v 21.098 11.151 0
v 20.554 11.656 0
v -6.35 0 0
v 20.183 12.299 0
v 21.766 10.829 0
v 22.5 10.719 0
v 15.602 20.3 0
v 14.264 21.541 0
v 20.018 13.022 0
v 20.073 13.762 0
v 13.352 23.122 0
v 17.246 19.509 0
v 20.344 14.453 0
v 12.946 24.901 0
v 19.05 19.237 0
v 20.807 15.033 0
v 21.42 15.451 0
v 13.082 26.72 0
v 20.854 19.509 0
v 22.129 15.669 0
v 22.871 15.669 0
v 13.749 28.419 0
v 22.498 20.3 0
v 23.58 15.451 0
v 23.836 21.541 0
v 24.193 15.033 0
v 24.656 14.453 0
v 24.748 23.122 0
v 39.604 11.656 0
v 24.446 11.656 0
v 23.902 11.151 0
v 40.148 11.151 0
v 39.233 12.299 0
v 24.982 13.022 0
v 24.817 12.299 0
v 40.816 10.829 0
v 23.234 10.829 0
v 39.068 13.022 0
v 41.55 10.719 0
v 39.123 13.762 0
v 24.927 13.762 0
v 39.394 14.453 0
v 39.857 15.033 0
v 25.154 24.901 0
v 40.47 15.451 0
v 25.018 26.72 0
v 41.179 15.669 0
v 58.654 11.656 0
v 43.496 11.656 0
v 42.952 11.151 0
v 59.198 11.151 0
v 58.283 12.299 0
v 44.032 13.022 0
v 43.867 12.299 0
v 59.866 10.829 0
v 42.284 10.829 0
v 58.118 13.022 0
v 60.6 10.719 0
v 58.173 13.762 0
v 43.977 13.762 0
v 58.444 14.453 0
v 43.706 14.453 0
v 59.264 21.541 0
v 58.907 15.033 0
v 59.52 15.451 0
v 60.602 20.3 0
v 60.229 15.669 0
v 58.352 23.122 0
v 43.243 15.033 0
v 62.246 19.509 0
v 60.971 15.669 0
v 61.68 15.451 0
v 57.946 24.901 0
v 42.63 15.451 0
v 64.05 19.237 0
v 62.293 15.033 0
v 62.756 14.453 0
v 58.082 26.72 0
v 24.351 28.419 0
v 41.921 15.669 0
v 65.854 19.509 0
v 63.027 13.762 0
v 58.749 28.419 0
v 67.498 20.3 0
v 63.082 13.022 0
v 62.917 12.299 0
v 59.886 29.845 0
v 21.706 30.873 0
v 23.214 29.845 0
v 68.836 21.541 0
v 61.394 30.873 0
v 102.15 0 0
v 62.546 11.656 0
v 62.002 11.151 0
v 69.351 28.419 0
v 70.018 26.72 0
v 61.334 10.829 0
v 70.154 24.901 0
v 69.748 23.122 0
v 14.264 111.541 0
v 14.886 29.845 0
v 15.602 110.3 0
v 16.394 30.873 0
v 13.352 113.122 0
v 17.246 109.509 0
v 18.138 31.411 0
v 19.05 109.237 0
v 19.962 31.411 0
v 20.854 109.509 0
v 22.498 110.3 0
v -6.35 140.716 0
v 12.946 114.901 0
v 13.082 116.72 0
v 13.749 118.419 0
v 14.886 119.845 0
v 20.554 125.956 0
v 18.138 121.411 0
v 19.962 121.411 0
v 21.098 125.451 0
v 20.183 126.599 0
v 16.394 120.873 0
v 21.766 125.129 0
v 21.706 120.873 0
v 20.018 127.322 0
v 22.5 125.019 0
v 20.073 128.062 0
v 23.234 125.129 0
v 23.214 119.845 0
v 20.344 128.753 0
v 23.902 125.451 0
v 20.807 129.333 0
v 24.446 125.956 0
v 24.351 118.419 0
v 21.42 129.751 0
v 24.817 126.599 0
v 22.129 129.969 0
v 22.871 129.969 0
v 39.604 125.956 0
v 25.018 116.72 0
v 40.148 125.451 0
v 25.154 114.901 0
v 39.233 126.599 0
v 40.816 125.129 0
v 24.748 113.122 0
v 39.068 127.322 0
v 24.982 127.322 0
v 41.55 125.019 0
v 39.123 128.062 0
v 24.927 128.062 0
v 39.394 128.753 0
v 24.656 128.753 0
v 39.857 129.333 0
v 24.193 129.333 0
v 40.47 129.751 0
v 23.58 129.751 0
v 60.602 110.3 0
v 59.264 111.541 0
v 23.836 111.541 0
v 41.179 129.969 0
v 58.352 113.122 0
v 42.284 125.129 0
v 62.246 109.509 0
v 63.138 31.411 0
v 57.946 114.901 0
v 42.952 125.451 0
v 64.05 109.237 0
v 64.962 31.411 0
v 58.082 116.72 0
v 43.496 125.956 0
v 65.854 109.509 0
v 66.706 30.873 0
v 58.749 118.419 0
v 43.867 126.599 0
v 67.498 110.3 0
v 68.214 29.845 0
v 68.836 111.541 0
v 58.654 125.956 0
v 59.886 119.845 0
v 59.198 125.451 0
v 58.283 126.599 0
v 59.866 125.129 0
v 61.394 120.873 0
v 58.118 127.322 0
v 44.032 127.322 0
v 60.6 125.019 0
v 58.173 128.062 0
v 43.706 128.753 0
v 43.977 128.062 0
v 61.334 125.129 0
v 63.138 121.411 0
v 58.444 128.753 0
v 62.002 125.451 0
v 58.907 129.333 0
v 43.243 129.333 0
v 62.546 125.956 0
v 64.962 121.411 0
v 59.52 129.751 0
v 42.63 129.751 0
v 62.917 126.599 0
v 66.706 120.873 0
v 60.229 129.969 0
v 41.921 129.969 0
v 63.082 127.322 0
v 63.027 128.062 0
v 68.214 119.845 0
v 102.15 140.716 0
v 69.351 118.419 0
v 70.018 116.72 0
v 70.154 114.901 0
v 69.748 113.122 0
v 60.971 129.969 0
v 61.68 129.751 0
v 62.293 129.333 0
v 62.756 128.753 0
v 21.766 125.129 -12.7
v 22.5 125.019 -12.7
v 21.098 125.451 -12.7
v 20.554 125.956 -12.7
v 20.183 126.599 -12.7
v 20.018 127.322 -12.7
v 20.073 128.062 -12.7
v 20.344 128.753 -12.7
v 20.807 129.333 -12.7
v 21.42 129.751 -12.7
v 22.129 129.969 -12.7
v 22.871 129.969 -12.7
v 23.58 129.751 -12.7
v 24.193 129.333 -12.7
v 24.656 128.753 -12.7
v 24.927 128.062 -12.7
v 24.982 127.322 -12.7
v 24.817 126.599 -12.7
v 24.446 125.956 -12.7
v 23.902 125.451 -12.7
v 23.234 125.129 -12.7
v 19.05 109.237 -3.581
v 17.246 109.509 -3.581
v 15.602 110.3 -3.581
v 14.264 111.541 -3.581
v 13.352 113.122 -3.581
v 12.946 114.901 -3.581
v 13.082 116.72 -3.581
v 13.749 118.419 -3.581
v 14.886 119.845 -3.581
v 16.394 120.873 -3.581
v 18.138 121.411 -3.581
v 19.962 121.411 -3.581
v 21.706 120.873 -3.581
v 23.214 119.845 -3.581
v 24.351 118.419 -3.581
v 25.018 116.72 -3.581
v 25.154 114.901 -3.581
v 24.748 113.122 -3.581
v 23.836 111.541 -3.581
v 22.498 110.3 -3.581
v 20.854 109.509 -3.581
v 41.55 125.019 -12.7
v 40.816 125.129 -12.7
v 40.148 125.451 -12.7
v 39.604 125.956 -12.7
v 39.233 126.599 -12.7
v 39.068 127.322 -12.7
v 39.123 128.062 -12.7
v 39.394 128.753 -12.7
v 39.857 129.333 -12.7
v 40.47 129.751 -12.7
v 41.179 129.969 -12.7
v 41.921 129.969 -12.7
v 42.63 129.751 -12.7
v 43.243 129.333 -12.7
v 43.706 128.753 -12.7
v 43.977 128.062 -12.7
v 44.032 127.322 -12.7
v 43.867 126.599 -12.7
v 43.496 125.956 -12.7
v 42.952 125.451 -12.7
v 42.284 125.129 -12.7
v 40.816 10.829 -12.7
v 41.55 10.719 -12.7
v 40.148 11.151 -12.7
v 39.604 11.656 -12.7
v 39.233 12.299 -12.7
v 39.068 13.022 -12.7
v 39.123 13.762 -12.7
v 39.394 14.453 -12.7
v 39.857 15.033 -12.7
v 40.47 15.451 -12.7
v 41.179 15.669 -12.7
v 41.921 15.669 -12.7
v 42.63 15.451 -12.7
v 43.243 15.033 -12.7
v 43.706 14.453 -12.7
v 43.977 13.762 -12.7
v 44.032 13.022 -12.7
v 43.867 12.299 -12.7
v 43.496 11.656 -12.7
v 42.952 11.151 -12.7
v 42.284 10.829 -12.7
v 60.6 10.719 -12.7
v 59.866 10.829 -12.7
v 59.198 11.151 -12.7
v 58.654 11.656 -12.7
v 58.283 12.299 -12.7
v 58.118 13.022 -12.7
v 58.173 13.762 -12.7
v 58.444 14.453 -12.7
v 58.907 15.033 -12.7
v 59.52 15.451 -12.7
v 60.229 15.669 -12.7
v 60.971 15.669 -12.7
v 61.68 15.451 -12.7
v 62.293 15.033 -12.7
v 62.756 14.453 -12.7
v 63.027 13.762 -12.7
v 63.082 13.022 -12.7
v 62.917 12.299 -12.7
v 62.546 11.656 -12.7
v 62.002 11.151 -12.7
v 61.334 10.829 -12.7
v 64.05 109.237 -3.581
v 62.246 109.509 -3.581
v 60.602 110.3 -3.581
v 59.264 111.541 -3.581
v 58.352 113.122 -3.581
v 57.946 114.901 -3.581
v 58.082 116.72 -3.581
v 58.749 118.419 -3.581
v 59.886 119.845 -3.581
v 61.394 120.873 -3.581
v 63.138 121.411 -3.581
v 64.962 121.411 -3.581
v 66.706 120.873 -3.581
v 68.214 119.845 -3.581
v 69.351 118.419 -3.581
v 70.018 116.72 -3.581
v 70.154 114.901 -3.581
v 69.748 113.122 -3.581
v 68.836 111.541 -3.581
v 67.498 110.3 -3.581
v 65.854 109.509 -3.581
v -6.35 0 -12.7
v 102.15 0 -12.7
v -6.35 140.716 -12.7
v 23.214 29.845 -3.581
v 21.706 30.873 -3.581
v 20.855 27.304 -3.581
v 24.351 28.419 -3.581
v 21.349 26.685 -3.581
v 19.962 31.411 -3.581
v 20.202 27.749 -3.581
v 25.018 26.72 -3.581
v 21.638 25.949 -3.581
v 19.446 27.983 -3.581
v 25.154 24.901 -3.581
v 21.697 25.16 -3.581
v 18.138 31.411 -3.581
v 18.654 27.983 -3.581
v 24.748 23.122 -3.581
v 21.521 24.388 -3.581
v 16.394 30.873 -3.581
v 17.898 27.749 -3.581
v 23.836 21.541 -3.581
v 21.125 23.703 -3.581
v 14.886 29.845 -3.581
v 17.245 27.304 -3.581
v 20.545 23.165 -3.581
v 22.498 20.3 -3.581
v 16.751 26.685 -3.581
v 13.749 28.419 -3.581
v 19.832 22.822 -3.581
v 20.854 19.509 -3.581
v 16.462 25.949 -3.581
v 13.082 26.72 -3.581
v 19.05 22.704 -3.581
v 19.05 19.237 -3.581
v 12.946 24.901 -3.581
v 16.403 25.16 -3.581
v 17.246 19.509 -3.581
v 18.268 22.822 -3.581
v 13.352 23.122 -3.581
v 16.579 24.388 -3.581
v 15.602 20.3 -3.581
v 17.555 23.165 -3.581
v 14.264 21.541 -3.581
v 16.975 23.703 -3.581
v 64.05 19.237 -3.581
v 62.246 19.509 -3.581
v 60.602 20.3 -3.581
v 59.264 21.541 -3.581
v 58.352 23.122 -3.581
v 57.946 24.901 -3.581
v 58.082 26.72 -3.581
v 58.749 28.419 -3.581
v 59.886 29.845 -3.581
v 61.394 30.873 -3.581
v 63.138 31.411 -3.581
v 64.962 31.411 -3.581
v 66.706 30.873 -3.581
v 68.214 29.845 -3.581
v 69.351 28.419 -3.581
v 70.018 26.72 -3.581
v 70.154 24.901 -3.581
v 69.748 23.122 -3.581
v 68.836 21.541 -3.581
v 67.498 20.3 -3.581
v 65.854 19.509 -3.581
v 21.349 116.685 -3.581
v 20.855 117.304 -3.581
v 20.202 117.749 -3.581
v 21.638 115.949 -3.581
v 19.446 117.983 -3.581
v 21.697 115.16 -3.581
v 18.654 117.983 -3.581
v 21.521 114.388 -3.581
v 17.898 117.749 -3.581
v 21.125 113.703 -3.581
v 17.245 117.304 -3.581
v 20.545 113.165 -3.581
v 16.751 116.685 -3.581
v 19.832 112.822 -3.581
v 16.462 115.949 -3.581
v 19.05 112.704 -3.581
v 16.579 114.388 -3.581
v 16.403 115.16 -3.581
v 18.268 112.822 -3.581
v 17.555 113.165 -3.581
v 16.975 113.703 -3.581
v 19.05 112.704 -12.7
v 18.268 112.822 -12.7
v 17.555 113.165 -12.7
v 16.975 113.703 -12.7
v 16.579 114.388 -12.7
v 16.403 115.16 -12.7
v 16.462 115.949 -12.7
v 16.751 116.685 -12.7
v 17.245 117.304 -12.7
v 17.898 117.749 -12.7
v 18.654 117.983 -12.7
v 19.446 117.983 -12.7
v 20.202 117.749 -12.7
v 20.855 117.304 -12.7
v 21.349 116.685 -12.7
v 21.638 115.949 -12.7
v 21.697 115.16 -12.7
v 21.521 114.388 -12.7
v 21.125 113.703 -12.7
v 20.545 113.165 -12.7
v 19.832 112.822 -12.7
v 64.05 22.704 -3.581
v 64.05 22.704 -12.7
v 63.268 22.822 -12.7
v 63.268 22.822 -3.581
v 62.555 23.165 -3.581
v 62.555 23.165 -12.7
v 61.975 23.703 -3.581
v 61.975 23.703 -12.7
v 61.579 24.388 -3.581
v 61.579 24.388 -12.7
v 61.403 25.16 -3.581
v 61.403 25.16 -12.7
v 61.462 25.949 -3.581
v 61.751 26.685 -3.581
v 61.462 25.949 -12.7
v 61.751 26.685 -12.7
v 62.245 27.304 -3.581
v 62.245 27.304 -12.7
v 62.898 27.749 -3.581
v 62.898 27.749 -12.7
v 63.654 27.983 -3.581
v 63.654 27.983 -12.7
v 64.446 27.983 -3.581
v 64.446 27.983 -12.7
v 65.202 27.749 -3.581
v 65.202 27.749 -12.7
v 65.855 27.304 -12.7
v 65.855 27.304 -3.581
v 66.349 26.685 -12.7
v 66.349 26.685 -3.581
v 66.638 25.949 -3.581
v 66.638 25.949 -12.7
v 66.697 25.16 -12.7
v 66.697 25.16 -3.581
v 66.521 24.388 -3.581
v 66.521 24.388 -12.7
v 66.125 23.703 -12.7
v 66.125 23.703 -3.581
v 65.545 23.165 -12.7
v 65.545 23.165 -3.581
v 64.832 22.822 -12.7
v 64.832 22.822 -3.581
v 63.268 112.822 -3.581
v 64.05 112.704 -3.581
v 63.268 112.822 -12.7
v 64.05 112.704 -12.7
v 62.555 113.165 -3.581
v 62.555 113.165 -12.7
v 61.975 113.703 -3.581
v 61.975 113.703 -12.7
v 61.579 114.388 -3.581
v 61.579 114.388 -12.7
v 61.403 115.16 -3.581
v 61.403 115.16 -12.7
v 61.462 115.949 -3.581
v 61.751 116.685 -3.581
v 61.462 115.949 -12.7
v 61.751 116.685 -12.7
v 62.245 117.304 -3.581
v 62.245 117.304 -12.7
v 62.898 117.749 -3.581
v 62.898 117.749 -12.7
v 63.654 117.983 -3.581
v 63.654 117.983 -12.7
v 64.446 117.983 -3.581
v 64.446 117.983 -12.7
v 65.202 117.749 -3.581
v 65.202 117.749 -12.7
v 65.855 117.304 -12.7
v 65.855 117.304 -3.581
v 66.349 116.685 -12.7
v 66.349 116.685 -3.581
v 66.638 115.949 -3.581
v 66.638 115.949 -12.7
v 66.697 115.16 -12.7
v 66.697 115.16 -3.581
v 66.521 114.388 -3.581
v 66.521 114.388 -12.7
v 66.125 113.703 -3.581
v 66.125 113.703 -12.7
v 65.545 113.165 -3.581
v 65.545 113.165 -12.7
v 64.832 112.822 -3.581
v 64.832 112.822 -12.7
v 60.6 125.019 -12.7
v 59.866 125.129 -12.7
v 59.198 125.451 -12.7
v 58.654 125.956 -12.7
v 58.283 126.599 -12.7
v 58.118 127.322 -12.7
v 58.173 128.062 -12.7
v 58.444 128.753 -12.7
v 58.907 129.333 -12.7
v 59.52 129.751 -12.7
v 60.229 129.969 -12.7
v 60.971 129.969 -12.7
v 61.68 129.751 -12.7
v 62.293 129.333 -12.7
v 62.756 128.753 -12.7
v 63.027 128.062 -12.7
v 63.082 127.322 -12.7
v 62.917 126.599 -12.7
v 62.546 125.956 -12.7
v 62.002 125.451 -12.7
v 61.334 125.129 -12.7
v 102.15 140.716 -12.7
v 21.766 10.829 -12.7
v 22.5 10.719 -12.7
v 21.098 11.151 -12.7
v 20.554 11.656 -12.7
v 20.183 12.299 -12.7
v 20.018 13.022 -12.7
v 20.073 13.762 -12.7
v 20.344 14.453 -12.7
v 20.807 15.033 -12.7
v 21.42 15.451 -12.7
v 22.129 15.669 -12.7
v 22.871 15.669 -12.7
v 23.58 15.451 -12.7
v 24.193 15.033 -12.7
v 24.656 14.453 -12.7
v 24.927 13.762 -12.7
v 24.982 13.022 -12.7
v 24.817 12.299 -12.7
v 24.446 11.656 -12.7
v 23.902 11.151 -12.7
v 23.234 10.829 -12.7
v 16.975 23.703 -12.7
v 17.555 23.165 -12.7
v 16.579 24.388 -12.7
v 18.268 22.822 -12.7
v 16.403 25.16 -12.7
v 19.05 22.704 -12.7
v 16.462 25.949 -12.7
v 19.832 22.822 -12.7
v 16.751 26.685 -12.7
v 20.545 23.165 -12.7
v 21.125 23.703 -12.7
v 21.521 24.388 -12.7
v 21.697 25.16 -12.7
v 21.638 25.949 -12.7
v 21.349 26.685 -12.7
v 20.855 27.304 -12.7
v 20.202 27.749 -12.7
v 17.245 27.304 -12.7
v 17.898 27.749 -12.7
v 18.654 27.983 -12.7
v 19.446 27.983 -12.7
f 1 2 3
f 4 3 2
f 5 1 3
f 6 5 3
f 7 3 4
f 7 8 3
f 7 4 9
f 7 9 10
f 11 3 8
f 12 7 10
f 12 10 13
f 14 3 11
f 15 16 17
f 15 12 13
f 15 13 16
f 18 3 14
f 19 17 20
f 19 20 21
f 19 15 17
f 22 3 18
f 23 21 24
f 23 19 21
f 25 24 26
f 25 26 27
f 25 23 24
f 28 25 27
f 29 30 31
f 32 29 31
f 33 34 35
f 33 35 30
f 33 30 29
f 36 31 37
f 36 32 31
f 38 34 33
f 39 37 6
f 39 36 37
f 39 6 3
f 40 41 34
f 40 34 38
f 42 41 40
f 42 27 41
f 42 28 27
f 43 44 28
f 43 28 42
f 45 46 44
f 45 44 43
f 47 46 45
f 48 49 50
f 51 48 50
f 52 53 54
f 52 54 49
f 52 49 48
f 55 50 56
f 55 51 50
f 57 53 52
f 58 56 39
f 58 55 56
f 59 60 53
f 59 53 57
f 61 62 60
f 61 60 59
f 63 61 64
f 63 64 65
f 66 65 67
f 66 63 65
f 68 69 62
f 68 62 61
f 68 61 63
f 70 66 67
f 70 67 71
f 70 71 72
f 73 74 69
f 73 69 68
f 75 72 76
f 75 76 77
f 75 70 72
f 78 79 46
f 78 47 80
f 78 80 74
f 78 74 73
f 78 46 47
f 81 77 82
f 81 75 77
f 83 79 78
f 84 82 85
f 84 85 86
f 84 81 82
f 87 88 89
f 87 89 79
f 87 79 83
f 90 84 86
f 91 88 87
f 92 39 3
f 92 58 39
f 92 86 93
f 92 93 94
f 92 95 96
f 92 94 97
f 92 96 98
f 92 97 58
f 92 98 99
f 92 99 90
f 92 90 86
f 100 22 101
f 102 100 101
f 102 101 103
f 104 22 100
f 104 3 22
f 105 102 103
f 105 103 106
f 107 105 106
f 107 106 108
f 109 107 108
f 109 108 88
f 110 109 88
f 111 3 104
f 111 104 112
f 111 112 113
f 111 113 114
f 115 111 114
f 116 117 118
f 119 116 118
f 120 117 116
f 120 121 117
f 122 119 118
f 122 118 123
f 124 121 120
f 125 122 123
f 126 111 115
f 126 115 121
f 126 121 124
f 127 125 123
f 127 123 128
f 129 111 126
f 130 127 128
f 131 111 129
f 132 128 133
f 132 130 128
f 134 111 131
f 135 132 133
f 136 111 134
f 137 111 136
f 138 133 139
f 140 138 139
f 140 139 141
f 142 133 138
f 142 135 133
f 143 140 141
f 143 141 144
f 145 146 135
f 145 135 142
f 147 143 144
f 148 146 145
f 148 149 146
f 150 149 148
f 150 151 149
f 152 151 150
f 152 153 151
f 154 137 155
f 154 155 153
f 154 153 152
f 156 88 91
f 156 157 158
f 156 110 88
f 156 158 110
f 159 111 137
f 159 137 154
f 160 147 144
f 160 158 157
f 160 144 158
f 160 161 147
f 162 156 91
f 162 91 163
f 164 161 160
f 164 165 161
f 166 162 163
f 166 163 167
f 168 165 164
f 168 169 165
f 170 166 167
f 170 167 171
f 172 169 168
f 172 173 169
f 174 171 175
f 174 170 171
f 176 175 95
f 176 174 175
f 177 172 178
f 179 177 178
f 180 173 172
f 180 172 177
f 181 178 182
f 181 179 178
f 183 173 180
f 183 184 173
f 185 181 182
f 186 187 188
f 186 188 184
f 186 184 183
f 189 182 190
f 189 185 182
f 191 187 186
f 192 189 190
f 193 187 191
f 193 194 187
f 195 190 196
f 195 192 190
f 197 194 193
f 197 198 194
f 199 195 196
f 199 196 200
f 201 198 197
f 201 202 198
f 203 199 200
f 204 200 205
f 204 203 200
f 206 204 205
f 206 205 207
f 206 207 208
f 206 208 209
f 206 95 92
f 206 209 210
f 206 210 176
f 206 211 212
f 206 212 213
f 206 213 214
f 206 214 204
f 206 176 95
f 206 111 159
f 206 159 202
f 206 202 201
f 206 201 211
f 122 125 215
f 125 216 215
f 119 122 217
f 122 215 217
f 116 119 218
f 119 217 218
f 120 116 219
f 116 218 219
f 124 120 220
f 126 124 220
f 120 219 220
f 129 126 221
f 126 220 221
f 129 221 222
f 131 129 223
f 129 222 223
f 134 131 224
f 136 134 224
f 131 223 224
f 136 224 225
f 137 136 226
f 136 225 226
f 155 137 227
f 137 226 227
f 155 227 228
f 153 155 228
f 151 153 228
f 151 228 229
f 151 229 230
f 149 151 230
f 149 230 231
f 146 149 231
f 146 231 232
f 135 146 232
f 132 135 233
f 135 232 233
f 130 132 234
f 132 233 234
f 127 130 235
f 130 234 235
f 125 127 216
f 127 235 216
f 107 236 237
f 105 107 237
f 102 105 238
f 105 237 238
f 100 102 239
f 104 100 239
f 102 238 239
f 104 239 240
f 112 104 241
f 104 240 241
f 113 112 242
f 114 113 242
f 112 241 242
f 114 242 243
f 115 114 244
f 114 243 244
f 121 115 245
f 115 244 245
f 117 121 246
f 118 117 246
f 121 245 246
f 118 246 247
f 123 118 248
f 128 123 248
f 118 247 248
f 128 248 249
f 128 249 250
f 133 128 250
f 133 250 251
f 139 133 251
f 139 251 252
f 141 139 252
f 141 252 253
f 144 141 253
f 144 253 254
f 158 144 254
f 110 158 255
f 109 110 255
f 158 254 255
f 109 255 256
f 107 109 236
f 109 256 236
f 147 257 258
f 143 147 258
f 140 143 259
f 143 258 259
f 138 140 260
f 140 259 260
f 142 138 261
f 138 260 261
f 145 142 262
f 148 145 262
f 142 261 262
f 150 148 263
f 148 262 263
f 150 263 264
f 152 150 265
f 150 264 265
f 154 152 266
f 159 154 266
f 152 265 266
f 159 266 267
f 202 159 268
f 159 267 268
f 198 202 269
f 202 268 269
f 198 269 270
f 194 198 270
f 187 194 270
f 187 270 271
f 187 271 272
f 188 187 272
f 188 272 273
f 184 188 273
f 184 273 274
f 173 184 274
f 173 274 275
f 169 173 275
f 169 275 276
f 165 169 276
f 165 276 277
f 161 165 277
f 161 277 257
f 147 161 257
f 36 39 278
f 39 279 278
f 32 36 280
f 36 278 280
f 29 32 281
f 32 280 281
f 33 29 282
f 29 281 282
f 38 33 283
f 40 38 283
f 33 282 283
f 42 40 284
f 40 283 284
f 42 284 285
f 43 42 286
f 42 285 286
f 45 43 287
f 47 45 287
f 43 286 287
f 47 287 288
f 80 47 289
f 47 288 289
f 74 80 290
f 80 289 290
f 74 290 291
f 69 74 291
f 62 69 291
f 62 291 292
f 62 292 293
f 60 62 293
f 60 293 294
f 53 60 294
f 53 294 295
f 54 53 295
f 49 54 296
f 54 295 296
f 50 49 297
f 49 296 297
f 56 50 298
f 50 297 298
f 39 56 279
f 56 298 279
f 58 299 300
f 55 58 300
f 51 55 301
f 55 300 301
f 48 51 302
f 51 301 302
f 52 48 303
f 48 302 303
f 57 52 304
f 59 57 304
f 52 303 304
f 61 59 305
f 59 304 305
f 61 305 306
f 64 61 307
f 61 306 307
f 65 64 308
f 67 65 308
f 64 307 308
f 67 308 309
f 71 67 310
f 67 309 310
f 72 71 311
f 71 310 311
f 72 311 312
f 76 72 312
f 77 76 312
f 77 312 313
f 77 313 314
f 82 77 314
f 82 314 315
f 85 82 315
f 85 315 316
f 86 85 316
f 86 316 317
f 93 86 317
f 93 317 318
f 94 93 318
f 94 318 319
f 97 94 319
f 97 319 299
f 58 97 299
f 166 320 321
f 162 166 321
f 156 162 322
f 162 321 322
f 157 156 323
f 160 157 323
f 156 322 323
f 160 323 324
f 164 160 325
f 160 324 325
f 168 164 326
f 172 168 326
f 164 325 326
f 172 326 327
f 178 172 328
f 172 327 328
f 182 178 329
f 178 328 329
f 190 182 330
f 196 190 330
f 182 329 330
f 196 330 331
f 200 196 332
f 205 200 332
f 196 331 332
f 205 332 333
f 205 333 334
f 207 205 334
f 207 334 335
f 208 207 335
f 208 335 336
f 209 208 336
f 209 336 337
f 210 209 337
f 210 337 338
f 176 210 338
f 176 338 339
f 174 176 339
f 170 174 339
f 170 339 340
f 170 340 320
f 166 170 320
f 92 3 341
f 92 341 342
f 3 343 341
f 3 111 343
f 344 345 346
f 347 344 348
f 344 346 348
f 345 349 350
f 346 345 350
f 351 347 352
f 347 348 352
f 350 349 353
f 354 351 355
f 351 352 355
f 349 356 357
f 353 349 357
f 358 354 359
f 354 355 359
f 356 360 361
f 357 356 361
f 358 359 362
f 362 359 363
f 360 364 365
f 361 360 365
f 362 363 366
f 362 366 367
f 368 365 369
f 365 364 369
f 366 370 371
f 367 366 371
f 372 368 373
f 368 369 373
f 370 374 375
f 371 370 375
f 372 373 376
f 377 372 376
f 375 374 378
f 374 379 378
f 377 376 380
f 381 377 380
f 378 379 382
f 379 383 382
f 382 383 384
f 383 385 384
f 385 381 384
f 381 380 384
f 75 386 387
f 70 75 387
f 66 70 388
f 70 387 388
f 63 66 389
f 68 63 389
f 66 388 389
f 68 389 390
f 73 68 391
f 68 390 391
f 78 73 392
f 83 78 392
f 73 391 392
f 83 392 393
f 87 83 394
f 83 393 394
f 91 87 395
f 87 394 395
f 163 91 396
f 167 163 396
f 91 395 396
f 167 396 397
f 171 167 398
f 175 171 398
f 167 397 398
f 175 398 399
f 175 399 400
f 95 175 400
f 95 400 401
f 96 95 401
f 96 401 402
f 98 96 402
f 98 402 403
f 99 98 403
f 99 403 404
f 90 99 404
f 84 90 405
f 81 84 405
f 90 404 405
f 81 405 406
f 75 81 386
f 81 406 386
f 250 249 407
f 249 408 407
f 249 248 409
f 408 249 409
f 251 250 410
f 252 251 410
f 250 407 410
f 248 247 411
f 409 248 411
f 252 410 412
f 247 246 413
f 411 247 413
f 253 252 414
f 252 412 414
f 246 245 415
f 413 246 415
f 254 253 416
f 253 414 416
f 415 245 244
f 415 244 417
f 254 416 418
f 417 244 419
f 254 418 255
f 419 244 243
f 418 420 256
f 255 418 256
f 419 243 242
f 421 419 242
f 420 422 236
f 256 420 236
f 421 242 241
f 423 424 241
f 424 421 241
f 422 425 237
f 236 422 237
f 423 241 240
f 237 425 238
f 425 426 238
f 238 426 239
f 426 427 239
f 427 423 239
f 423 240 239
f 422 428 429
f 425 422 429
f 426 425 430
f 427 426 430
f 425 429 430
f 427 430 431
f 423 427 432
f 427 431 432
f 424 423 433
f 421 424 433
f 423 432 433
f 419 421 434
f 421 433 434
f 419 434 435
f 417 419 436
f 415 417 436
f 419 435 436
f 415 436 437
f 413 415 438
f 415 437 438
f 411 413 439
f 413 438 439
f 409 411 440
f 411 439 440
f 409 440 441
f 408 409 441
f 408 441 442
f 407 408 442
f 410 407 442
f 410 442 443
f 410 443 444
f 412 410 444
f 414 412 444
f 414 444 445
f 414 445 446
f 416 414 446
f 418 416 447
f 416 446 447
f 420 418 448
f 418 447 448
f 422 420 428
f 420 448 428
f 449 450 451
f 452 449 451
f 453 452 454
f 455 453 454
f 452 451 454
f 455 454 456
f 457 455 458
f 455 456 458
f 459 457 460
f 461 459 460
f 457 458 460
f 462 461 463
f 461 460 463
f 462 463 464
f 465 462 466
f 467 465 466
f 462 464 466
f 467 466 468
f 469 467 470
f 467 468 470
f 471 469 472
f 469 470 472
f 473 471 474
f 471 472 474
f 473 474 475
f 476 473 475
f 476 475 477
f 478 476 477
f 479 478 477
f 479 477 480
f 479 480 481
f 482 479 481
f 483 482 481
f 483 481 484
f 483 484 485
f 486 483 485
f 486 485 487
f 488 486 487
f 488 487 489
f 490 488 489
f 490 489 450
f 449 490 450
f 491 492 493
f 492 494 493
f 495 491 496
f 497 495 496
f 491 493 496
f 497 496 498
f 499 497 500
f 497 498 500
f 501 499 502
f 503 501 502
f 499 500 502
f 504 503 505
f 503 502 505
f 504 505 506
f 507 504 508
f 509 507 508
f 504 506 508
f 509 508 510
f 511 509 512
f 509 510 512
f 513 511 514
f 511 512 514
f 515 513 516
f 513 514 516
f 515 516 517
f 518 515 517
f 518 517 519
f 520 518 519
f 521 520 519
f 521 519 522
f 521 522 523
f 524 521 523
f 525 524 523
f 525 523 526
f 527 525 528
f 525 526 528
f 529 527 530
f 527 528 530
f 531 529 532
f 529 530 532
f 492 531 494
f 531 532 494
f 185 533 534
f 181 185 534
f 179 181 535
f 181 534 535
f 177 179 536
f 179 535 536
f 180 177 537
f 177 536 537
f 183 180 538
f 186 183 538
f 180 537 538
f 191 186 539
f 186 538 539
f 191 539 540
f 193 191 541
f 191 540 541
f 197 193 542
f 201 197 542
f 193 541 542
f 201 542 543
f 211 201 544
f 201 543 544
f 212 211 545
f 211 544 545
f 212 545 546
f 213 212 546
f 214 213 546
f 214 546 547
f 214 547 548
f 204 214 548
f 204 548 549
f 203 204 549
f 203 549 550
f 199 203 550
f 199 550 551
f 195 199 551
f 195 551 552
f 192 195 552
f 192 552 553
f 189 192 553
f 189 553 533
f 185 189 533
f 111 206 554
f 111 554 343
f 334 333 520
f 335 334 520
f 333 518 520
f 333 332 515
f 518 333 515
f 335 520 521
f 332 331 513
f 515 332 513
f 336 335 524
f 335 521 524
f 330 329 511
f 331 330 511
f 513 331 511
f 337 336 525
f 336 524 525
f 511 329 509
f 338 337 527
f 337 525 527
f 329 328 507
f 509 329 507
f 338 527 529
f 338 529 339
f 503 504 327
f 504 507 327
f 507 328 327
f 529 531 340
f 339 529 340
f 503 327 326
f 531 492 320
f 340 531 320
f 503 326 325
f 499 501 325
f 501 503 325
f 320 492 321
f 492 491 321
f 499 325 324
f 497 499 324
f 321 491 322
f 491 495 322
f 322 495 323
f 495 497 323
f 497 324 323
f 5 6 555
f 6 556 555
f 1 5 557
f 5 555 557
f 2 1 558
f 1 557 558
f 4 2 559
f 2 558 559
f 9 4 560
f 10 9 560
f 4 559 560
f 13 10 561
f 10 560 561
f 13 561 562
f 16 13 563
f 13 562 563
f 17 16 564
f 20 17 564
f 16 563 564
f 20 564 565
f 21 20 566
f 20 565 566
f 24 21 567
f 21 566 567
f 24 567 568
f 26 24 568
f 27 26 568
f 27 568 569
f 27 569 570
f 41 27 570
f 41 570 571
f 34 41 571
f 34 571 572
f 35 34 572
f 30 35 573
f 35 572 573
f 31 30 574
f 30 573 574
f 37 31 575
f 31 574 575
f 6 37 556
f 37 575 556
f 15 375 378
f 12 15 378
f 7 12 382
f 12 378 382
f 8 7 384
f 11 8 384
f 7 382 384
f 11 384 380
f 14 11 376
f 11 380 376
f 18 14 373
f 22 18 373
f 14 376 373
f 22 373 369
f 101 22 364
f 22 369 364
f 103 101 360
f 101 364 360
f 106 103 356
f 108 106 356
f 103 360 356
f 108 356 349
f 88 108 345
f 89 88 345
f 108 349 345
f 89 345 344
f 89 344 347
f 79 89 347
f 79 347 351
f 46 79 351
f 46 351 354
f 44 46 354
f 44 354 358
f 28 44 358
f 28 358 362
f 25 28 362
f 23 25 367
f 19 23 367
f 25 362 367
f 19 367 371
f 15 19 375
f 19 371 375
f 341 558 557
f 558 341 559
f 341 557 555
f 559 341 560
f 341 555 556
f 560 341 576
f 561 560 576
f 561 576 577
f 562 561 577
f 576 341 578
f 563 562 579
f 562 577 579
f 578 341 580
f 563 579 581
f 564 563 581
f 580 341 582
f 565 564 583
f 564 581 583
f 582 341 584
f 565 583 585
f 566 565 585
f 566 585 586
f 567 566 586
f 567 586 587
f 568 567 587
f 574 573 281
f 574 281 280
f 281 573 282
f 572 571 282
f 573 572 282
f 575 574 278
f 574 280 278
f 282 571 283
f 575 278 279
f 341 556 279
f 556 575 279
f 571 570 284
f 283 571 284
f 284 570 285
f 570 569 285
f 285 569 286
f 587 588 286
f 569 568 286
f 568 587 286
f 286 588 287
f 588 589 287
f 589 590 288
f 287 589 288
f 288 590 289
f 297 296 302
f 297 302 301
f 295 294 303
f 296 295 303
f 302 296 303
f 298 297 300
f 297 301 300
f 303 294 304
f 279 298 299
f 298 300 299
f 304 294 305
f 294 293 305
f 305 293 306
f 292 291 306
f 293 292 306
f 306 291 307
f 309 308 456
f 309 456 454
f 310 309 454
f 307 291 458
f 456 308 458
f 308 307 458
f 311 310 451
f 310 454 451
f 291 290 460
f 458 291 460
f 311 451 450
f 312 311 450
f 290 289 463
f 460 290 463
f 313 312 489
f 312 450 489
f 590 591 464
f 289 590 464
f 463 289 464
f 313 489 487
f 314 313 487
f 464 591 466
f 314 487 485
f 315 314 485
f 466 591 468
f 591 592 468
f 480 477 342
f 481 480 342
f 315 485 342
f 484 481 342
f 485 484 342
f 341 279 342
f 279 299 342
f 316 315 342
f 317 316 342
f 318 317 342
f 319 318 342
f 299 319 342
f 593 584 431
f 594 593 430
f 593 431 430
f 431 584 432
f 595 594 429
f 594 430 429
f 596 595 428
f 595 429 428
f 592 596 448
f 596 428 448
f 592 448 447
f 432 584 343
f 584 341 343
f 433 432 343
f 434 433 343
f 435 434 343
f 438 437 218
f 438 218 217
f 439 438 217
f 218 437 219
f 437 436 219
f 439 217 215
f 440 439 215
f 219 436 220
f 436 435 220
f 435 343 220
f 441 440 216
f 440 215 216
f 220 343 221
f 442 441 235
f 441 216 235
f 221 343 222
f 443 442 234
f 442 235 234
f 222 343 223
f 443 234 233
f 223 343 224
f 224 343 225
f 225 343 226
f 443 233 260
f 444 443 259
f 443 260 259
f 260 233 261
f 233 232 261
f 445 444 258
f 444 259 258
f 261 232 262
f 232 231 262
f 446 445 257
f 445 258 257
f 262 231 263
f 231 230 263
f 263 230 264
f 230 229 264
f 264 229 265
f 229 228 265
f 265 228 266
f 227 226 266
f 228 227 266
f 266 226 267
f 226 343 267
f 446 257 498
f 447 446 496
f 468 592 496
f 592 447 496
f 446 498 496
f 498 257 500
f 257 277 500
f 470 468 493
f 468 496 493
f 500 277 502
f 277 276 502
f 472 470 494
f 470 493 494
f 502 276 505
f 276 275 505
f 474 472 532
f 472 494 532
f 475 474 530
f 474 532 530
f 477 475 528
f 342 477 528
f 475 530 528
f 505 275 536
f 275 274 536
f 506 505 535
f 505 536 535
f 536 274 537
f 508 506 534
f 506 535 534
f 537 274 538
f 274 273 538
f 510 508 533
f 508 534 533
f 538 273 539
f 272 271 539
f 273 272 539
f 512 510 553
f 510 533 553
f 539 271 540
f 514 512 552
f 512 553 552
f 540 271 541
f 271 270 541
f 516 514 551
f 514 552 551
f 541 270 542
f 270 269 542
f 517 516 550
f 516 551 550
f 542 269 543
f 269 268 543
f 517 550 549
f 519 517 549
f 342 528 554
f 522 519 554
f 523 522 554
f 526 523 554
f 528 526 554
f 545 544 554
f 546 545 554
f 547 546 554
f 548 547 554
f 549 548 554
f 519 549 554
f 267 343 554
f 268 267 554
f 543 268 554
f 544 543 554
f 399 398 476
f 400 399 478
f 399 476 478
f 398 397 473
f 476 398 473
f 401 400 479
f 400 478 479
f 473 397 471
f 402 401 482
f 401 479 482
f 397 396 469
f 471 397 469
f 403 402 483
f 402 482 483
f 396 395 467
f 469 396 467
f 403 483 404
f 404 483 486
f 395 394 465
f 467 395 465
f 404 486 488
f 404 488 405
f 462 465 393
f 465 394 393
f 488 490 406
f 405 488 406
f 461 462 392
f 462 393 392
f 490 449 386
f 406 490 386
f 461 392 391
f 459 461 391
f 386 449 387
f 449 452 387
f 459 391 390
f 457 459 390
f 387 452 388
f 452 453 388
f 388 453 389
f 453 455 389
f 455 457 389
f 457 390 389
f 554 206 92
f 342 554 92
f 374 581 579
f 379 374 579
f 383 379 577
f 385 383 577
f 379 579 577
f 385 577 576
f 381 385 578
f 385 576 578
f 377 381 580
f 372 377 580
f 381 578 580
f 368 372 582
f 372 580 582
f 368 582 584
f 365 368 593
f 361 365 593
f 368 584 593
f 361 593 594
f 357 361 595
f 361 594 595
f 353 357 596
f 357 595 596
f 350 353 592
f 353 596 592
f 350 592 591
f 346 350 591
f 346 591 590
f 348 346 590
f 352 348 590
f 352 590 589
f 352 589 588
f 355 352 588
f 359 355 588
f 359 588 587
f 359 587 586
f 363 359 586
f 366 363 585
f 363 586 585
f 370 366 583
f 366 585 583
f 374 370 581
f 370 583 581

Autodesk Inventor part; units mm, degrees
ref_plane "YZ Plane" through (0, 0, 0) normal (1, 0, 0) x (0, 1, 0)
ref_plane "XZ Plane" through (0, 0, 0) normal (0, 1, 0) x (-1, 0, 0)
ref_plane "XY Plane" through (0, 0, 0) normal (0, 0, 1) x (1, 0, 0)
sketch "Sketch1" plane through (0, 0, 0) normal (0, 0, 1) x (1, 0, 0)
  line L0 (0, 0) -> (83.1, 0)
  line L1 (83.1, 0) -> (83.1, 140.716)
  line L2 (83.1, 140.716) -> (0, 140.716)
  line L3 (0, 140.716) -> (0, 0)
  line L4 (83.1, 70.358) -> (0, 70.358)
  circle A0 centre (19.05, 115.358) radius 2.5
  circle A1 centre (19.05, 25.358) radius 2.5
  circle A2 centre (64.05, 115.358) radius 2.5
  circle A3 centre (64.05, 25.358) radius 2.5
  line L5 (41.55, 140.716) -> (41.55, 0)
  circle A4 centre (41.55, 127.508) radius 3.175
  circle A5 centre (41.55, 13.208) radius 3.175
  circle A6 centre (22.5, 127.508) radius 3.175
  circle A7 centre (22.5, 13.208) radius 3.175
  circle A8 centre (60.6, 127.508) radius 3.175
  circle A9 centre (60.6, 13.208) radius 3.175
  line L6 (83.1, 140.716) -> (102.15, 140.716)
  line L7 (102.15, 140.716) -> (102.15, 0)
  line L8 (102.15, 0) -> (83.1, 0)
  line L9 (83.1, 0) -> (83.1, 140.716)
  line L10 (0, 140.716) -> (-6.35, 140.716)
  line L11 (-6.35, 140.716) -> (-6.35, 0)
  line L12 (-6.35, 0) -> (0, 0)
  line L13 (0, 0) -> (0, 140.716)
  dimension "d0" = 140.716
  dimension "d1" = 5
  dimension "d2" = 90
  dimension "d3" = 19.05
  dimension "d6" = 45
  dimension "d11" = 19.05
  dimension "d12" = 6.35
  dimension "d13" = 114.3
  dimension "d32" = 19.05
  dimension "d37" = 19.05
  dimension "d38" = 6.35
extrude "Extrusion1" add sketch "Sketch1" against normal blind 12.7 contours L3 L4 L5 A5 L0 | L12 L11 L10 L3 | L5 A5 L4 L1 L0 | L3 L2 L5 A4 L4 | L1 L6 L7 L8 | A5 L5 | L5 A5 | L5 A4 L2 L1 L4 | A4 L5 | L5 A4 | A0 | A1 | A2 | A3 | A6 | A7 | A8 | A9
hole "Hole1" at (19.05, 115.358, 0) at (64.05, 115.358, 0) at (64.05, 25.358, 0) at (19.05, 25.358, 0) direction (0, 0, -1) diameter 5.3086 end through all counterbore diameter 12.2428 counterbore depth 3.5814 clearance for "Hex Head Bolt" size "M5" standard "Ansi Metric M Profile"
hole "Hole2" at (22.5, 127.508, 0) at (60.6, 127.508, 0) at (22.5, 13.208, 0) at (60.6, 13.208, 0) at (41.55, 127.508, 0) at (41.55, 13.208, 0) direction (0, 0, -1) diameter 4.9784 end through all thread size "1/4-20 UNC" class "2B" standard "ANSI Unified Screw Threads"
equation "\"d11\" = d3"
properties part number "Adjustable Side Adapter Plate"
